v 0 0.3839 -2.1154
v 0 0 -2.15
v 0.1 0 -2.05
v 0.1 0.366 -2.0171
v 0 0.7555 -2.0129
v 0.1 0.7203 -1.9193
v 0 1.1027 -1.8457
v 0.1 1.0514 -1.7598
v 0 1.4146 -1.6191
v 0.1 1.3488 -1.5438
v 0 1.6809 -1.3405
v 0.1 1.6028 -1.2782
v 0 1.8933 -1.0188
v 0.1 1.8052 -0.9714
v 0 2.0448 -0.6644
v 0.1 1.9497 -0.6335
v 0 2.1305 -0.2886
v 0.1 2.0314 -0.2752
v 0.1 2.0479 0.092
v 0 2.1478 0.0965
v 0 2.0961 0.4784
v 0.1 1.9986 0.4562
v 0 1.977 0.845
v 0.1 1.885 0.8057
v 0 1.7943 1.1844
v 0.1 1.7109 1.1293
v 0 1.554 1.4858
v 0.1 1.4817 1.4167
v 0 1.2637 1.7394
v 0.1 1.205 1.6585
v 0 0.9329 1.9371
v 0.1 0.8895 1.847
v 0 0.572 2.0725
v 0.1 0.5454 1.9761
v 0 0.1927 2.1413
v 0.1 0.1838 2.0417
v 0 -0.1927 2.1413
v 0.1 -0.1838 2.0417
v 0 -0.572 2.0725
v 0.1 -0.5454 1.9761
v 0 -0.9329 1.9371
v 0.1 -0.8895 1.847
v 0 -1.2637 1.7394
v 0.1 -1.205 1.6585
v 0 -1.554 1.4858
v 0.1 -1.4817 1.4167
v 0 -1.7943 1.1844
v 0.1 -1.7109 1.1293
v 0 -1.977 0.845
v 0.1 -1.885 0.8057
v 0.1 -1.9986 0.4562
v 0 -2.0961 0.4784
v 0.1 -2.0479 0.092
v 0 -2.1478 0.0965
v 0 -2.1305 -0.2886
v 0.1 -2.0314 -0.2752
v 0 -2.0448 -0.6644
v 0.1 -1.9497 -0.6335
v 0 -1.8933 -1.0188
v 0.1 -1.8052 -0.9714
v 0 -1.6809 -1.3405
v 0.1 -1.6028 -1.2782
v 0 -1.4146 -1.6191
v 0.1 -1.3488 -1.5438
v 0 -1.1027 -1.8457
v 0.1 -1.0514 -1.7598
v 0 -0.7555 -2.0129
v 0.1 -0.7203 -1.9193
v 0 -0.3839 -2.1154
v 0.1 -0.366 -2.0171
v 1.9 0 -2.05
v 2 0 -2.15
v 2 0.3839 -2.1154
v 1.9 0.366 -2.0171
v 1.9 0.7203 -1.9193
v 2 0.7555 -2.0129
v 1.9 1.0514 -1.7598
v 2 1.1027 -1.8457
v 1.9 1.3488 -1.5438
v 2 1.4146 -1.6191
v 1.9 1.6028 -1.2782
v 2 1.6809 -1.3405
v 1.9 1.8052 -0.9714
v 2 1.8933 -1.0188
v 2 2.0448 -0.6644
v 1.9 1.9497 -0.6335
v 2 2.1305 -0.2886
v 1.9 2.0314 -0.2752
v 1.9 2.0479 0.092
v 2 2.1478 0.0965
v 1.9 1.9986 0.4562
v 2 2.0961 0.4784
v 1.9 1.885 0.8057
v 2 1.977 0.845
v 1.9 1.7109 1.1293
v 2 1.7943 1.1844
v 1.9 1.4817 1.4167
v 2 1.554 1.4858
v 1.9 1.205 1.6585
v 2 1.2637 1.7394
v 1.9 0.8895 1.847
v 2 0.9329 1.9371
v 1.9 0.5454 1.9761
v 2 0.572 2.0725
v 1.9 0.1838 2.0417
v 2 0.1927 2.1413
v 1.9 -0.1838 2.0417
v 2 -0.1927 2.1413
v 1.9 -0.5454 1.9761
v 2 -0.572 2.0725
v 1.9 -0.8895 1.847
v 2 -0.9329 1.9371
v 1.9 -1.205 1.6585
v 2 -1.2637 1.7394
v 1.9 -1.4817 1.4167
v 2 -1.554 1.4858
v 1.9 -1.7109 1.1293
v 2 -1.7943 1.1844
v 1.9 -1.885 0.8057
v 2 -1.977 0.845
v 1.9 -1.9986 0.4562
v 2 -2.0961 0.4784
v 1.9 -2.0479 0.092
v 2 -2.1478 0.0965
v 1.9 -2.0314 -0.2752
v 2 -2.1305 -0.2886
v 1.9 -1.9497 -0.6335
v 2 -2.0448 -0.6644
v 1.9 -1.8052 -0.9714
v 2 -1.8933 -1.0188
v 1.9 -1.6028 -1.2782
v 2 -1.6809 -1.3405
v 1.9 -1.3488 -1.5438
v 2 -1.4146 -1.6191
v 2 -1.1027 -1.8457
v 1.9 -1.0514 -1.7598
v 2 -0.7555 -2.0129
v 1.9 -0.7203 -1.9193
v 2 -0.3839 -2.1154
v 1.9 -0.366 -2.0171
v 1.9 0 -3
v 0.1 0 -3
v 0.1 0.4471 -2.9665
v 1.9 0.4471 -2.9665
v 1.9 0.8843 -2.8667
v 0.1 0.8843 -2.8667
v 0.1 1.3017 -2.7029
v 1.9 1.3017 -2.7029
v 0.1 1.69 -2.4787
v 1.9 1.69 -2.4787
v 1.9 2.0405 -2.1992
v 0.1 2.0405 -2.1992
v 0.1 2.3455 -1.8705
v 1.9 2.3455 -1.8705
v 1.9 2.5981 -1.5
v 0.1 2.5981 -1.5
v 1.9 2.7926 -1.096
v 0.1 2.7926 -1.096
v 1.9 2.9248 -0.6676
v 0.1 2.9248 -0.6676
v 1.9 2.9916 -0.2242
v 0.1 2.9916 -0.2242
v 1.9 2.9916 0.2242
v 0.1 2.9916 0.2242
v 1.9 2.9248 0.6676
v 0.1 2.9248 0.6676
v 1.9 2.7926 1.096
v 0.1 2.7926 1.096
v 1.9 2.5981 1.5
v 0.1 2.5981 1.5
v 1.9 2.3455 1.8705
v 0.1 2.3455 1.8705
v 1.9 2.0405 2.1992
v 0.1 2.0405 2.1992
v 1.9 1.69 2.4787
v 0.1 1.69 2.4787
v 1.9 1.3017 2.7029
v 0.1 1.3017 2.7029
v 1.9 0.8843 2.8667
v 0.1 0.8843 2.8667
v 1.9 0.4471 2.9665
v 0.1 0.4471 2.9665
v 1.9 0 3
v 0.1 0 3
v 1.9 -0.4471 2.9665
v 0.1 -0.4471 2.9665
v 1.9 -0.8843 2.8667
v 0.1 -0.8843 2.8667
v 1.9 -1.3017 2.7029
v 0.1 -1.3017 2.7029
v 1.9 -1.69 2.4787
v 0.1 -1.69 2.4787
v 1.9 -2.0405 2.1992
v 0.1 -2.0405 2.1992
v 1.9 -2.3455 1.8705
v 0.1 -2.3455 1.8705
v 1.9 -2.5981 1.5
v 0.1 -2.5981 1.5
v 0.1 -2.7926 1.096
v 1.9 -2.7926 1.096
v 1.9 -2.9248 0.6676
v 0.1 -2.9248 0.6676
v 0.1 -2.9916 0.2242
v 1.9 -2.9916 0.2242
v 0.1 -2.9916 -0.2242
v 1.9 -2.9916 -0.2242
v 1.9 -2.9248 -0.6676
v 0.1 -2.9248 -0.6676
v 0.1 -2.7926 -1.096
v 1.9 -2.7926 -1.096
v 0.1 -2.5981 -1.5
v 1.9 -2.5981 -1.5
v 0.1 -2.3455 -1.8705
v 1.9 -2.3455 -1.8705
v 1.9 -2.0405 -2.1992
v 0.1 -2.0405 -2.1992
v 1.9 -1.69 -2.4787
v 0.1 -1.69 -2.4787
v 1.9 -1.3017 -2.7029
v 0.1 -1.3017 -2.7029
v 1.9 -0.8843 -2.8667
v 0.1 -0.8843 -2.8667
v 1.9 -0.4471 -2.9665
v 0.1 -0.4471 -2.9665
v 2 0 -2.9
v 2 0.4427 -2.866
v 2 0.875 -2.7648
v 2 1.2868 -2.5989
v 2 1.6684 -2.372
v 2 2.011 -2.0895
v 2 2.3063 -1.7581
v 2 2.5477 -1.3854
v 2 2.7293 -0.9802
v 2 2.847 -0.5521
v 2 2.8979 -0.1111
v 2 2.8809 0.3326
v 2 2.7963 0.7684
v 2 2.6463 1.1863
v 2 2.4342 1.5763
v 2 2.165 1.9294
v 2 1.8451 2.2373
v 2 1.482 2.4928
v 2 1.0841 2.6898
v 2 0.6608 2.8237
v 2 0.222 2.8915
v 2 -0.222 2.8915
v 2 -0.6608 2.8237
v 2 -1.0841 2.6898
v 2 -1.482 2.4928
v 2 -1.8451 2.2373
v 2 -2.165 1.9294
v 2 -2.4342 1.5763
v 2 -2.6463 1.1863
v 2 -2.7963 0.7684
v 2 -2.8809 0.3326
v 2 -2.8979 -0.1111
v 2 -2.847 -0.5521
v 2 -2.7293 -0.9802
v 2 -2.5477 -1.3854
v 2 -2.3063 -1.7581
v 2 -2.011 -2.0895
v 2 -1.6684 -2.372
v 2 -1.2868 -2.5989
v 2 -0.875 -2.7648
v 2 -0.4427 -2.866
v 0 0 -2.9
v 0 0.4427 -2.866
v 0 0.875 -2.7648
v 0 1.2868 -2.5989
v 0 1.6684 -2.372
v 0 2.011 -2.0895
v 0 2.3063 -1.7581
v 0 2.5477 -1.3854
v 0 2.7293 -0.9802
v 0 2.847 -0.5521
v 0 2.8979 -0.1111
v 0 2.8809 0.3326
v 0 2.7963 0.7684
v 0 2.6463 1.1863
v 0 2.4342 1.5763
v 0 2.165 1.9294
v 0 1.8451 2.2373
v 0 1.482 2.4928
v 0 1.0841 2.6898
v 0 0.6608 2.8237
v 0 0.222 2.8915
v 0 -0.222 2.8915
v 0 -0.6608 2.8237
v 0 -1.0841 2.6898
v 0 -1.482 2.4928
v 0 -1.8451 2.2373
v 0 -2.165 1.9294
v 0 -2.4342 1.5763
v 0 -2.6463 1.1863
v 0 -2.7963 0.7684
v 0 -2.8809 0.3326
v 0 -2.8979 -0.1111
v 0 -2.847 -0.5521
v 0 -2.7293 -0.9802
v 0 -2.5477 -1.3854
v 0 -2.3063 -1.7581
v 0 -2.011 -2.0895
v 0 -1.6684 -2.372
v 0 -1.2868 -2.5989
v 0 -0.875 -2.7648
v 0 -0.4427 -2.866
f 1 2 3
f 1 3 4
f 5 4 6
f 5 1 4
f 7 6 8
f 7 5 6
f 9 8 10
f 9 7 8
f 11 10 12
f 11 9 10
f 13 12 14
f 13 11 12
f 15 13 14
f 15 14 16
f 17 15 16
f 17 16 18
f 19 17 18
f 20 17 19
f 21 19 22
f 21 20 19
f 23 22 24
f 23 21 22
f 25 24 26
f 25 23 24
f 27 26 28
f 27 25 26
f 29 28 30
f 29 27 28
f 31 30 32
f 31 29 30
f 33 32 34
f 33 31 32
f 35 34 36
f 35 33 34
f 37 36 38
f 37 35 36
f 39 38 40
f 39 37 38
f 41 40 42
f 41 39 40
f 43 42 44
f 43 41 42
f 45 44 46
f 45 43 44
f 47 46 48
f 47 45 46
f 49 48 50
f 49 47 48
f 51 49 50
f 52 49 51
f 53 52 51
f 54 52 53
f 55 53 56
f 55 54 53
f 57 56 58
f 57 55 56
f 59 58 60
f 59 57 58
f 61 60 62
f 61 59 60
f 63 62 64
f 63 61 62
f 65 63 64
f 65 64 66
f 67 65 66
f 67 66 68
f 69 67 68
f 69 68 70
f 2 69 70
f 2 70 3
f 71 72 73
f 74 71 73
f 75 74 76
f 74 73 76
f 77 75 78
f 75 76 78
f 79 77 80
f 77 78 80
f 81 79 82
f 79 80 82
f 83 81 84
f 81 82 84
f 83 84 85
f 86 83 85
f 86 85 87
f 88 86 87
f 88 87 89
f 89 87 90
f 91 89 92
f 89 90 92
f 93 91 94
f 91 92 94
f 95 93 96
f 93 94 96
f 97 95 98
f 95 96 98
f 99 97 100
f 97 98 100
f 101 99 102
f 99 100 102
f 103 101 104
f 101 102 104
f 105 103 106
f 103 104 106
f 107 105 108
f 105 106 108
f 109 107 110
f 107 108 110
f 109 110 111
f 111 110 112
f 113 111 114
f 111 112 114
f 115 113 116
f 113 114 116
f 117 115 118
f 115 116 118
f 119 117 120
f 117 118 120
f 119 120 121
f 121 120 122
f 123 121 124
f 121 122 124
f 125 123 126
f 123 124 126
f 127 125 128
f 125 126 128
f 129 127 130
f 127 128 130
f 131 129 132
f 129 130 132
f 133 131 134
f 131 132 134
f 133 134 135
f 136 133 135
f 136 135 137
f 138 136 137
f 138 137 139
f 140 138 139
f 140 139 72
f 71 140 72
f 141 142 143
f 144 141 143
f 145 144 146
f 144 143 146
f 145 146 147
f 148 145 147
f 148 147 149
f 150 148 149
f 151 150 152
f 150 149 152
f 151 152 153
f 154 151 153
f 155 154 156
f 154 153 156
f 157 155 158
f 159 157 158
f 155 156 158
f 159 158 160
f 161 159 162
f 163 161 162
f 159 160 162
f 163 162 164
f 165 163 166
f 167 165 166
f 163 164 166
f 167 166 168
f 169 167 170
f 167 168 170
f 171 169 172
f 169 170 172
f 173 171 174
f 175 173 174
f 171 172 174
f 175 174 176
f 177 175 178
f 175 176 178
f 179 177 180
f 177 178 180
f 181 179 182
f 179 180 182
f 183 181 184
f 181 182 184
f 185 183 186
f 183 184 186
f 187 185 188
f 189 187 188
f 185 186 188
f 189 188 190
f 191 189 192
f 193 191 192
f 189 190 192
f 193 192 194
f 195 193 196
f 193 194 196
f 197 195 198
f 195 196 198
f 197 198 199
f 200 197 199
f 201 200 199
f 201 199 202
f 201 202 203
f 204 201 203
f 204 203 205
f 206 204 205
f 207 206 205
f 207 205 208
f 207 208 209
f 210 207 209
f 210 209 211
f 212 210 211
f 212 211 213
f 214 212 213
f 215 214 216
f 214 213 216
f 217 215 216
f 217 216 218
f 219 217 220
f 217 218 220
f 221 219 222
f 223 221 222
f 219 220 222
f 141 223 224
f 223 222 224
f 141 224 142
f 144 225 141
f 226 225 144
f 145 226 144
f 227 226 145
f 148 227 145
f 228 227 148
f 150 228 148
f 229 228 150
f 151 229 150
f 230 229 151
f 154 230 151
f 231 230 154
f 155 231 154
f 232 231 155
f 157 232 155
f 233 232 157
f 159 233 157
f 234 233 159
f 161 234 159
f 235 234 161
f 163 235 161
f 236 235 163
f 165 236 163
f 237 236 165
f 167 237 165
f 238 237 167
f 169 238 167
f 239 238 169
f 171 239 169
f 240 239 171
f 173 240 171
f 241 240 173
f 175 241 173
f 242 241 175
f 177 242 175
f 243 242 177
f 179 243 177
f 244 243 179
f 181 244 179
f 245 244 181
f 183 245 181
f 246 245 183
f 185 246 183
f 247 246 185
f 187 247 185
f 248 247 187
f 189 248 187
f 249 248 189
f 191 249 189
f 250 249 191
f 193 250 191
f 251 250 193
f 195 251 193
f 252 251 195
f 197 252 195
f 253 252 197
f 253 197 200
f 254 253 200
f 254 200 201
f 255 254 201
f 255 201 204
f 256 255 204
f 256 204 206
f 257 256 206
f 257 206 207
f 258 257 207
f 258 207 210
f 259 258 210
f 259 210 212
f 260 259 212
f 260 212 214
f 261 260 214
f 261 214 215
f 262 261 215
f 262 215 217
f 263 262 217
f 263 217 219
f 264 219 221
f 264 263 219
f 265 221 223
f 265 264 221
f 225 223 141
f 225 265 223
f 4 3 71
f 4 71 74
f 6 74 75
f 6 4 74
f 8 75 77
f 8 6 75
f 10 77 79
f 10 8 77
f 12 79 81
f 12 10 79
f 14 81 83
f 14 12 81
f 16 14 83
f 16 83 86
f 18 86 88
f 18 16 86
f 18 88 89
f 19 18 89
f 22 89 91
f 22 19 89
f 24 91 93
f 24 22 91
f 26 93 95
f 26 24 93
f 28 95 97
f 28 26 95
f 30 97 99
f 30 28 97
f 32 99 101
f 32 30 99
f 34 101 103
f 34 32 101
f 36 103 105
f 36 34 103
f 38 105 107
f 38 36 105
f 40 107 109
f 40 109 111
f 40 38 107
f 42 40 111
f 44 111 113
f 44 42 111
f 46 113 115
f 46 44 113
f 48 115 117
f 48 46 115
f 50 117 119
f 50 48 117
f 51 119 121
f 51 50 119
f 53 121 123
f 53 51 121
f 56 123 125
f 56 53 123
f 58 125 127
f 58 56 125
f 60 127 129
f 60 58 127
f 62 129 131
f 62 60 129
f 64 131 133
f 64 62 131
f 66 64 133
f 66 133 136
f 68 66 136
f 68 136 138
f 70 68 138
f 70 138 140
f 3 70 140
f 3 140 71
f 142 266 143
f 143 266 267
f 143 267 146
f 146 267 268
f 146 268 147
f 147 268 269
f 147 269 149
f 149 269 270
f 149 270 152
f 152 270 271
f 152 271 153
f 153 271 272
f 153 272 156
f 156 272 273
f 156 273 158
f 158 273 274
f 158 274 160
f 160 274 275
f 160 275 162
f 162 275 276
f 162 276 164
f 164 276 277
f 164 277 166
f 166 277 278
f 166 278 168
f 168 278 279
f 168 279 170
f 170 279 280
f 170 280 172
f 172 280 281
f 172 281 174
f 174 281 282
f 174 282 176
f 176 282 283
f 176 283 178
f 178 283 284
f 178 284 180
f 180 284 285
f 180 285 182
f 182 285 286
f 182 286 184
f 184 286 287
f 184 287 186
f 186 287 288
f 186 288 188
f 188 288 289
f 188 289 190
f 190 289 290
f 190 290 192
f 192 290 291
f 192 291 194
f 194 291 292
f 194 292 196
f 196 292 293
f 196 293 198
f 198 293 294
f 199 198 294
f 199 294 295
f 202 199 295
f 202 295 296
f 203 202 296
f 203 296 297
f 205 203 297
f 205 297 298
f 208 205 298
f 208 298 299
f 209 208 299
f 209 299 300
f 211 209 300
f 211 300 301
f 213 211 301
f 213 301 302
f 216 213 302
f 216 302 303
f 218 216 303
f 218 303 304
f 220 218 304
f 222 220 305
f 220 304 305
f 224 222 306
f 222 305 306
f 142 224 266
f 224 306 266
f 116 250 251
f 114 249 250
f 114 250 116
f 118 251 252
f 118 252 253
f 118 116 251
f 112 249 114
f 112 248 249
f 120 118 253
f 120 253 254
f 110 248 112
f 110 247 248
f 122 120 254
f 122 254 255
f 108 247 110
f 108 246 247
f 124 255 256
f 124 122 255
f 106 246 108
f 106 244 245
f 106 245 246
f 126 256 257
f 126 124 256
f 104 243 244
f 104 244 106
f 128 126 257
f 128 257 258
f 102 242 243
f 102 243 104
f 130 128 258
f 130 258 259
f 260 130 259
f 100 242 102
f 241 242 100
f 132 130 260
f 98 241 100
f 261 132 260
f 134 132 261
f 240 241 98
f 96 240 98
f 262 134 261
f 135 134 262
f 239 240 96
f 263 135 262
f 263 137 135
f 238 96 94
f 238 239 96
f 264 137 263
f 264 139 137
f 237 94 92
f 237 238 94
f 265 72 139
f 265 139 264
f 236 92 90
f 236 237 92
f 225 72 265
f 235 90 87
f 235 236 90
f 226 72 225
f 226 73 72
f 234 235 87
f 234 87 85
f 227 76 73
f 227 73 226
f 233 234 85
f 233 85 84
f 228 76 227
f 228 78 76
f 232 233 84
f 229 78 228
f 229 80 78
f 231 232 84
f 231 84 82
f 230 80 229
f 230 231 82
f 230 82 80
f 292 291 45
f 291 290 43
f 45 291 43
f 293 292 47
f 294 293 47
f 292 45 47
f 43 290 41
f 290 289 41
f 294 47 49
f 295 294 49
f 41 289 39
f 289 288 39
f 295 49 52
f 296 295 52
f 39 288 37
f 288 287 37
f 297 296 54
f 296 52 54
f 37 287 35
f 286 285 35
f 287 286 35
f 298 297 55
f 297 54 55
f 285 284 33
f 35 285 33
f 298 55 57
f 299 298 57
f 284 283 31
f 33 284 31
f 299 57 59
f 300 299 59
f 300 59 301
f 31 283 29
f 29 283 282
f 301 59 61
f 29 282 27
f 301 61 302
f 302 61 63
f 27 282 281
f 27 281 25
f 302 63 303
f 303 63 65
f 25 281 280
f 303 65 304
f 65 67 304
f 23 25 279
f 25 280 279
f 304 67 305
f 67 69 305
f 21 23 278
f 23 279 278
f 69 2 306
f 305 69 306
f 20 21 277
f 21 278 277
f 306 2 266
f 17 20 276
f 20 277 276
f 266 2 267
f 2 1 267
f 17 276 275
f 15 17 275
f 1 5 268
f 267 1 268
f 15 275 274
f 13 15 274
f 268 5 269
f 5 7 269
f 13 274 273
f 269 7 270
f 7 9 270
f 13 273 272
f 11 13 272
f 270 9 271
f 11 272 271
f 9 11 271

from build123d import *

# Parameters (mm, degrees)
SKETCH_1_R      = 3
SKETCH_1_R_2    = 2.05
EXTRUDE_1_DEPTH = 2
CHAMFER_1_SIZE  = 0.1


with BuildPart() as part:
    # 草图1 → 凸台-拉伸1 (new body)
    with BuildSketch(Plane.YZ):
        with Locations(Location((0, 0, 0), (0, 0, 270))):
            Circle(SKETCH_1_R)
        with Locations(Location((0, 0, 0), (0, 0, 270))):
            Circle(SKETCH_1_R_2, mode=Mode.SUBTRACT)
    extrude(amount=EXTRUDE_1_DEPTH)

    # 倒角1
    chamfer_1_edges = [part.edges().sort_by_distance(p)[0] for p in [
        (0, 0, 3),
        (2, 0, 3),
        (0, 0, 2.05),
        (2, 0, 2.05),
    ]]
    chamfer(chamfer_1_edges, length=CHAMFER_1_SIZE)


solid = part.part
